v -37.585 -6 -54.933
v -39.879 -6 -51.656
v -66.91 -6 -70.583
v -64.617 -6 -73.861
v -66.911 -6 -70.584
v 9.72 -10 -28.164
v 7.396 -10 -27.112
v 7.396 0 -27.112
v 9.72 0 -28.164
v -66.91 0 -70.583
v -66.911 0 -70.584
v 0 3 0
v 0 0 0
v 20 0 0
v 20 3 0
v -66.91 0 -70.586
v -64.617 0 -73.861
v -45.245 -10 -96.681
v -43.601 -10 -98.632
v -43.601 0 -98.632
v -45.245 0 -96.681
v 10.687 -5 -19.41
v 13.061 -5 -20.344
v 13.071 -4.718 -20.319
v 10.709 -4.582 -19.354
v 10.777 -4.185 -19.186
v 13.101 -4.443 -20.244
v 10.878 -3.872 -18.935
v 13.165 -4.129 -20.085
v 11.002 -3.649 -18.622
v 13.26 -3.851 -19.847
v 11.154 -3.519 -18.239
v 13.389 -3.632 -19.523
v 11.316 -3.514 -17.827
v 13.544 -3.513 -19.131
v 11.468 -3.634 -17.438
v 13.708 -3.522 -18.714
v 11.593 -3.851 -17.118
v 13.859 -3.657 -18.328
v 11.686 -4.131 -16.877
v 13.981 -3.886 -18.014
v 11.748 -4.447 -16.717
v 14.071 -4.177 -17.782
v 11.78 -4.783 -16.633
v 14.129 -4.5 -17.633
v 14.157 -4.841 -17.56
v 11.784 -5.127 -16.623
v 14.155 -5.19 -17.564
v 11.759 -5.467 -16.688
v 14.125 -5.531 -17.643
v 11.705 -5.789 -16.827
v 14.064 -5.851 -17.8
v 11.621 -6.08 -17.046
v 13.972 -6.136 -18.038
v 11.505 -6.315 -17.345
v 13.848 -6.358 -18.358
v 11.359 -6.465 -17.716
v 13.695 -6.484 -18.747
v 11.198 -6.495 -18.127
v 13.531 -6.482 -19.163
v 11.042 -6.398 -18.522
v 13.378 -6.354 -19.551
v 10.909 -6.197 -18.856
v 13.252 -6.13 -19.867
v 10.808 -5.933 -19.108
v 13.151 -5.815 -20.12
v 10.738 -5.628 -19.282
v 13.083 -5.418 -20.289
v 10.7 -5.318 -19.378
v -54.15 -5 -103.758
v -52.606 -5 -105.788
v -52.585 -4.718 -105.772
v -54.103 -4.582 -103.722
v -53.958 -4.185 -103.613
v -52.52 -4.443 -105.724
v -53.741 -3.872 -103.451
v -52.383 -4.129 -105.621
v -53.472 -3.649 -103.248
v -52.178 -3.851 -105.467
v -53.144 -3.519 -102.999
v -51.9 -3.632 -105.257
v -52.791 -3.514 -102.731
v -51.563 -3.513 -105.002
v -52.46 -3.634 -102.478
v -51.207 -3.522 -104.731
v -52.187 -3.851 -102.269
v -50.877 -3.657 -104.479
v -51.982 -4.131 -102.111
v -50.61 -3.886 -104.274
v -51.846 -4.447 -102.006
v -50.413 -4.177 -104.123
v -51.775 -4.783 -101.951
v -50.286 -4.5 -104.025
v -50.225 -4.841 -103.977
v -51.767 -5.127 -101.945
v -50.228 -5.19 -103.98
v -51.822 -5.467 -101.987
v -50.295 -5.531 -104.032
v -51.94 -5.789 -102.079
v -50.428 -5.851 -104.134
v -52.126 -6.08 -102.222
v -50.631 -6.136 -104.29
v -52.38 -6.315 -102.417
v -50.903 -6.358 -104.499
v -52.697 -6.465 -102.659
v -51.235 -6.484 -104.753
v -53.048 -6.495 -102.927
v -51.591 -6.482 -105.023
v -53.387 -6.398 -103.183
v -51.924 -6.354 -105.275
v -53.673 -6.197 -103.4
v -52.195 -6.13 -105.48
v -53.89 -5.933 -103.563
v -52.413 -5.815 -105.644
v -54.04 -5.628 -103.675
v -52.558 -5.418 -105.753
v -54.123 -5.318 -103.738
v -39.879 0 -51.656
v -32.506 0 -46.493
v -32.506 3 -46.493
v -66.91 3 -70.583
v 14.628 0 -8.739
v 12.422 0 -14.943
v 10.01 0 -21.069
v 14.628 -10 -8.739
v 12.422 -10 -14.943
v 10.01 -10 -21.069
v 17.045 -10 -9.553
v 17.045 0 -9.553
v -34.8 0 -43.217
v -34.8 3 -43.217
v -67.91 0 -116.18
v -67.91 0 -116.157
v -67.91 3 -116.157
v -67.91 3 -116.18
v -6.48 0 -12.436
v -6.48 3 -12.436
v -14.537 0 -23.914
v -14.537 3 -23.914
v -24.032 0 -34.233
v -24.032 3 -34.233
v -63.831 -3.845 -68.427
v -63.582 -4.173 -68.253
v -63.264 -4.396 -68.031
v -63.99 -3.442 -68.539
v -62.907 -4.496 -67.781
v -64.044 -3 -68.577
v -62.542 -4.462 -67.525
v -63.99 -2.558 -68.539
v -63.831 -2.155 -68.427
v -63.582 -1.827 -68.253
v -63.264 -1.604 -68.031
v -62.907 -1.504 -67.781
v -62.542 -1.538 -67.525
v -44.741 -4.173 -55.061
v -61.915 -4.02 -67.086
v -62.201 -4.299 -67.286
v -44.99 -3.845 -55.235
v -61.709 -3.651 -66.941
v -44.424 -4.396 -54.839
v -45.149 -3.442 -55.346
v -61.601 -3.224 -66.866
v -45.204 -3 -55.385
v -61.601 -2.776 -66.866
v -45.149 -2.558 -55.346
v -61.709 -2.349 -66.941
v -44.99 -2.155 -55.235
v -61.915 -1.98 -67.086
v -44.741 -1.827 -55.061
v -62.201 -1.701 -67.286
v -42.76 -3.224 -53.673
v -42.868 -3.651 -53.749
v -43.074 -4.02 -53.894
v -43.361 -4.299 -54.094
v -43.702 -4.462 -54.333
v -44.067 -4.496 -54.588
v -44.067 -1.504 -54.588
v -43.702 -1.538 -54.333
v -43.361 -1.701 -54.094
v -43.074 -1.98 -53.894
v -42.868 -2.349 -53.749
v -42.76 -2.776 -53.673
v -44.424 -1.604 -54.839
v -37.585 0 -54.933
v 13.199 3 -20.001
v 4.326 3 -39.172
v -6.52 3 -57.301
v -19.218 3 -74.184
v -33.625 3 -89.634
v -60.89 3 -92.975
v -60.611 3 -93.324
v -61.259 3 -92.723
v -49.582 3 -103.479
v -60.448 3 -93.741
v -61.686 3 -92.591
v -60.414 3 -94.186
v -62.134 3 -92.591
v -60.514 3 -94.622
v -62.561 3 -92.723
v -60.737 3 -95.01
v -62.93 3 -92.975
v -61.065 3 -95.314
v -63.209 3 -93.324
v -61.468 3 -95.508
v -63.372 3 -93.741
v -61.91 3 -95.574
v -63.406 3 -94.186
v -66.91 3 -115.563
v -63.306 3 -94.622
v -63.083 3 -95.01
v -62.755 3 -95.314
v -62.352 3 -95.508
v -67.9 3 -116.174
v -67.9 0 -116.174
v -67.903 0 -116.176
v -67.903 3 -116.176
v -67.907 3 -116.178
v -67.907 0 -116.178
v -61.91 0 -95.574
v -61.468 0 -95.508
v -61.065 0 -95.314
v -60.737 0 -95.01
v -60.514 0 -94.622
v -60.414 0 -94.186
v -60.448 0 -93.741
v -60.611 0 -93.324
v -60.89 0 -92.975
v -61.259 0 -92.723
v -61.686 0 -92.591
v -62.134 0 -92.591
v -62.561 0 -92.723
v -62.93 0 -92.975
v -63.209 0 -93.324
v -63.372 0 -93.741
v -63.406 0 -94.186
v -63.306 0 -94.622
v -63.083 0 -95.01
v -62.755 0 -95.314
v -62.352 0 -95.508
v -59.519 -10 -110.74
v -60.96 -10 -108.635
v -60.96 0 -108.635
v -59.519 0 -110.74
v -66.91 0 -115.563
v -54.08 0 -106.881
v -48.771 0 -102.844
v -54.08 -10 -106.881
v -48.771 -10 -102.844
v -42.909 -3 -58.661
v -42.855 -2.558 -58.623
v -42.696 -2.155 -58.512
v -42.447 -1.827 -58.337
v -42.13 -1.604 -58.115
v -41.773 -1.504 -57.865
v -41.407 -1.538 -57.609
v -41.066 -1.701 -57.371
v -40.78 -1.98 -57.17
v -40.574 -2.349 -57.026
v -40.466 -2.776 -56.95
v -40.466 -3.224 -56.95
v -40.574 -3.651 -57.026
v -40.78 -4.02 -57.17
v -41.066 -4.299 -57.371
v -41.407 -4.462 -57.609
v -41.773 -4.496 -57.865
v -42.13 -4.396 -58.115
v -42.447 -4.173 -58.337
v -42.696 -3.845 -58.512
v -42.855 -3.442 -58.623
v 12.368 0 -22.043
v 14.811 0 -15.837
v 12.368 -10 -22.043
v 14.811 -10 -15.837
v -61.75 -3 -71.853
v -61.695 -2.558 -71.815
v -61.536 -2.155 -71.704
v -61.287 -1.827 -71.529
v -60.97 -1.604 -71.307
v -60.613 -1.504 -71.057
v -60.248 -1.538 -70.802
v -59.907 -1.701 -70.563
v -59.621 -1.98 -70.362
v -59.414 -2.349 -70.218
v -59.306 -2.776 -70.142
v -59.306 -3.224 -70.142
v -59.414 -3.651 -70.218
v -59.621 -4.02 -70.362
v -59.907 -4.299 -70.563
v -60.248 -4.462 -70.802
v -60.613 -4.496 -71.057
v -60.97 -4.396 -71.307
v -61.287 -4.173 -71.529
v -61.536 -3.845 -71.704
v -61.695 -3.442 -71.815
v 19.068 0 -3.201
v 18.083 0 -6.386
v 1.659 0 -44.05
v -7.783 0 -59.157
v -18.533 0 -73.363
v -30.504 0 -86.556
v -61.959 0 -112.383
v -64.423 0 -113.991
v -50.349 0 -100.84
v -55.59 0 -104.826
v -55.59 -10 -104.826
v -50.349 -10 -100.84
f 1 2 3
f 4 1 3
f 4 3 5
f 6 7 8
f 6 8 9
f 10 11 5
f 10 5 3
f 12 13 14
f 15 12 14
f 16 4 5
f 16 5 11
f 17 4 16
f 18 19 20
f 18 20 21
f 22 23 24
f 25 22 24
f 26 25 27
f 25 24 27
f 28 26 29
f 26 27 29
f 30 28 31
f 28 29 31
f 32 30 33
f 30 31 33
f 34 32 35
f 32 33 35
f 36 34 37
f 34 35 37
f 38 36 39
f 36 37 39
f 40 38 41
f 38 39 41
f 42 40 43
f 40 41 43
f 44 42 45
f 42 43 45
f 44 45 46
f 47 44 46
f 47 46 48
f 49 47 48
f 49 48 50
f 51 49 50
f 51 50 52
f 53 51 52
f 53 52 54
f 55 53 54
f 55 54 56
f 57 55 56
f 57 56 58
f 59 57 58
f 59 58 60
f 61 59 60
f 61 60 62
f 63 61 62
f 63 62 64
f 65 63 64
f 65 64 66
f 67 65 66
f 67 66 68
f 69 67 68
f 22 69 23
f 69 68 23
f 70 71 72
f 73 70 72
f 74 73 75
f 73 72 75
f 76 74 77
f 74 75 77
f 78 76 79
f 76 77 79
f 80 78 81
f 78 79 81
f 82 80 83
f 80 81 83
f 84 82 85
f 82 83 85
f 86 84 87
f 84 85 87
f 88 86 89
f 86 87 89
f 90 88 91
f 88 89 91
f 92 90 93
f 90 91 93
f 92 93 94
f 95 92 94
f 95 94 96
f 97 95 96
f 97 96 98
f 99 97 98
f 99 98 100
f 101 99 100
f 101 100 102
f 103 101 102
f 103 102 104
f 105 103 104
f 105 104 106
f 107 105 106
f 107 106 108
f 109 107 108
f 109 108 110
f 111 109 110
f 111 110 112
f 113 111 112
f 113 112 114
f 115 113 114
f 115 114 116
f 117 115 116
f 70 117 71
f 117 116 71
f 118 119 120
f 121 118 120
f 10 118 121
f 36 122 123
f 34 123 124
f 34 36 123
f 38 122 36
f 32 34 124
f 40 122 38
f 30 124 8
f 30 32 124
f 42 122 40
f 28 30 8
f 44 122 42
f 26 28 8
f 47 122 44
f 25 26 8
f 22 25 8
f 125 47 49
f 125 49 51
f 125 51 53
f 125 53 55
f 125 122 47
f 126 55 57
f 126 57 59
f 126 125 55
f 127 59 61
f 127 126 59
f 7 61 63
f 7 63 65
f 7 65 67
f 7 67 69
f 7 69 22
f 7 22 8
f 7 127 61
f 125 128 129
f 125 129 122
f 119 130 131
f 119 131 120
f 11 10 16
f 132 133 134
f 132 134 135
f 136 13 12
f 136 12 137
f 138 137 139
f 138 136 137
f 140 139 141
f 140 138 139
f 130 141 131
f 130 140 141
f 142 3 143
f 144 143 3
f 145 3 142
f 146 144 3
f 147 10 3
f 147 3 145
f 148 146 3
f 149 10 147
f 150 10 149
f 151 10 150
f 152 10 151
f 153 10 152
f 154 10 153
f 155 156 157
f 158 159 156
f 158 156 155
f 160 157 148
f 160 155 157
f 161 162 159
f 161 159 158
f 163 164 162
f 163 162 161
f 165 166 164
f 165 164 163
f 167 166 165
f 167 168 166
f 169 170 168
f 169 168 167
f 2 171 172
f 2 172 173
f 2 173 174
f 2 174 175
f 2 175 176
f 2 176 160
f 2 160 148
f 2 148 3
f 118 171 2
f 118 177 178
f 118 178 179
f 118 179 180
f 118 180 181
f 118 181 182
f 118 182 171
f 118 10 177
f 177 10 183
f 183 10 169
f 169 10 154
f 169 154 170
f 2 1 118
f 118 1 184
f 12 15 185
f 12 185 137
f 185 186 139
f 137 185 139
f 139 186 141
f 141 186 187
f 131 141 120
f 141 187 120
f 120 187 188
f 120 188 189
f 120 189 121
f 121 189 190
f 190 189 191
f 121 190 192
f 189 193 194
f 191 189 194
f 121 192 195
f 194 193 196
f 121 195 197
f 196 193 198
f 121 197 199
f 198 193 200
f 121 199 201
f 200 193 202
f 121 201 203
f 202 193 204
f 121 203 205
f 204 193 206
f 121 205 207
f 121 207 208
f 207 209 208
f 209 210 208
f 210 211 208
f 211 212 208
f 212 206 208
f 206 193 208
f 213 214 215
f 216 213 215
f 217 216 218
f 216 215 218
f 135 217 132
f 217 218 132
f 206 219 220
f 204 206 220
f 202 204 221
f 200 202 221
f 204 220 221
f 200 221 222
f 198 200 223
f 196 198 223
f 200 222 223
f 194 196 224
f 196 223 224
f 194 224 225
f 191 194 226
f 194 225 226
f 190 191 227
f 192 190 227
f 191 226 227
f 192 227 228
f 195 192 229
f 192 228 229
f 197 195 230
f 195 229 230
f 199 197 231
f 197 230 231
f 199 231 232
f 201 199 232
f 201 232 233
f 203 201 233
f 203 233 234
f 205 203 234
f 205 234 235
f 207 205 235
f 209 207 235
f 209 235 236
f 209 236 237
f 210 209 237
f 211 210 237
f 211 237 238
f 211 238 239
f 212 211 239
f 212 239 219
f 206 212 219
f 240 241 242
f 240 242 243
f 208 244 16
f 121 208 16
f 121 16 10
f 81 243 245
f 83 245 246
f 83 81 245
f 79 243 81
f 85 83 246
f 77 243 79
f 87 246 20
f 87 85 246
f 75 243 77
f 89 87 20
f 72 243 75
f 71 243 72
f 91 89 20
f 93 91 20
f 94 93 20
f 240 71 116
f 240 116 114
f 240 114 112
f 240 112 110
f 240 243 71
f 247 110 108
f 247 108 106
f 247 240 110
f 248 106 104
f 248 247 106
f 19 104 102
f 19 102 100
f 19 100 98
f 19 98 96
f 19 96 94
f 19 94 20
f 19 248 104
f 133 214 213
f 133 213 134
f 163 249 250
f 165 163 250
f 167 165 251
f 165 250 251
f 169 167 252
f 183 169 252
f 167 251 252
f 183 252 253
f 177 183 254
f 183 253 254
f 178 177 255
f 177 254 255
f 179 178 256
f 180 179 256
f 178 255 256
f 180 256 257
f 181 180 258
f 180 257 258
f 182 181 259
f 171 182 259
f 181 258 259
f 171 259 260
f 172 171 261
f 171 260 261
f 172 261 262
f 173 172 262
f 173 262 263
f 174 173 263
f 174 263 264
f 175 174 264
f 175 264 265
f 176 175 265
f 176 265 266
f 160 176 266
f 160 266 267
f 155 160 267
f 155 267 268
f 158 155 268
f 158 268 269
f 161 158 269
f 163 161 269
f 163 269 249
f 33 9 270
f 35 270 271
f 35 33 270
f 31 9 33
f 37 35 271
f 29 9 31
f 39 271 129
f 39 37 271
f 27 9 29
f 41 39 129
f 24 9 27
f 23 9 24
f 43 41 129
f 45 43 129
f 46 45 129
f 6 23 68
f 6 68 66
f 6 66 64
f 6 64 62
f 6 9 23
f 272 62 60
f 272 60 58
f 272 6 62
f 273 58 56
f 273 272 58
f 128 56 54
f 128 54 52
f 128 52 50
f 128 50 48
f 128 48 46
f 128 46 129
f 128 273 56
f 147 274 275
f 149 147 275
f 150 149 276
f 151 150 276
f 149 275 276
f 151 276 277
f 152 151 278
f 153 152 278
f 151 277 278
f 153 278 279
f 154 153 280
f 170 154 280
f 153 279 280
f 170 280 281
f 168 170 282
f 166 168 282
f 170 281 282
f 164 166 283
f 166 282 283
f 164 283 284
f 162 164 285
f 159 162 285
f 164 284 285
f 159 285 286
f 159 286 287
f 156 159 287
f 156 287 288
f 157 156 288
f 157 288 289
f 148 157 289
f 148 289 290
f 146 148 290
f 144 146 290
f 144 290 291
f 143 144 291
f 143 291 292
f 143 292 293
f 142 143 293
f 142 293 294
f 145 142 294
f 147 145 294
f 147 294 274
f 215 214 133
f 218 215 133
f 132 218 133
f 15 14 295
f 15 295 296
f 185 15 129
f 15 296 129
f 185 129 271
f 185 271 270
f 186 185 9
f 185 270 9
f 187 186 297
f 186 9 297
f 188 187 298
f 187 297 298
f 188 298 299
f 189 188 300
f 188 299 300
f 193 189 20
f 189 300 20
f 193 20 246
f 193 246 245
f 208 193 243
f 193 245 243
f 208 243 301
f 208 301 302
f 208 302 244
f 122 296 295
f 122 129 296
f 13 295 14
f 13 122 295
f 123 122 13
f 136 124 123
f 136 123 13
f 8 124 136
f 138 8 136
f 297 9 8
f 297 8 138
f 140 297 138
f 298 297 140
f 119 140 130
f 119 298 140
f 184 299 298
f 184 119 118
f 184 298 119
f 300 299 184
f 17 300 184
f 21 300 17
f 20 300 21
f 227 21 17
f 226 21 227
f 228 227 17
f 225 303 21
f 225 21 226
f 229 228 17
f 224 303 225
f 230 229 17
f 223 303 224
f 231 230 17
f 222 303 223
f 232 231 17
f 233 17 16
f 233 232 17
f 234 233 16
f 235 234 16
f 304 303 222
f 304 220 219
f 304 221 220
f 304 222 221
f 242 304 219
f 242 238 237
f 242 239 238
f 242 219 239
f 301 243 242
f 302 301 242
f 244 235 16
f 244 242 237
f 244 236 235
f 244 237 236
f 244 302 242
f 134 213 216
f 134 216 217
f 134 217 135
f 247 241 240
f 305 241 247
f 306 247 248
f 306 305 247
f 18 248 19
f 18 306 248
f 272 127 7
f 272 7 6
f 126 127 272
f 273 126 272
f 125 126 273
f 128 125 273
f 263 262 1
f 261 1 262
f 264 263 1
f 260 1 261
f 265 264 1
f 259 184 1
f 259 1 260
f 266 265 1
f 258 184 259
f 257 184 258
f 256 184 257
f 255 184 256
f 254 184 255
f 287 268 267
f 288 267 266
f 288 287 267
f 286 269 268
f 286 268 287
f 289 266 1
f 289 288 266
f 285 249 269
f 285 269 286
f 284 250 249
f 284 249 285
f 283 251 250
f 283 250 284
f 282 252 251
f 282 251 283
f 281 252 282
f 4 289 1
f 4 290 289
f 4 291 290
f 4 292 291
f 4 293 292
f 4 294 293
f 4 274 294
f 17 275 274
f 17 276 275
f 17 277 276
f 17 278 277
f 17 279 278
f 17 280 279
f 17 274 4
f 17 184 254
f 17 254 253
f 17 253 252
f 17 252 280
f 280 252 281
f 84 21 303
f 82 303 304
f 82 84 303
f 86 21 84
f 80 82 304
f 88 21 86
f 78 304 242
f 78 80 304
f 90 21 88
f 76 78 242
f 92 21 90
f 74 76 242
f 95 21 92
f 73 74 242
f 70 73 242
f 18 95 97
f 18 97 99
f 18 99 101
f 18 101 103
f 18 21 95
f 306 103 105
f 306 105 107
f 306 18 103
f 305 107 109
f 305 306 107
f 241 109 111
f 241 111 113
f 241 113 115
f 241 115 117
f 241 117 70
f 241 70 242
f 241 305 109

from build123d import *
from build123d.topology import SkipClean

# Parameters (mm, degrees)
BOSS_EXTRUDE1_DEPTH = 3
BOSS_EXTRUDE2_DEPTH = 6
SKETCH3_R           = 1.5
SKETCH3_W           = 9.001604742
SKETCH3_H           = 6
SKETCH3_W_2         = 4.02
CUT_EXTRUDE1_DEPTH  = 127.726009226
BOSS_EXTRUDE3_DEPTH = 3
BOSS_EXTRUDE4_START = 10
BOSS_EXTRUDE4_DEPTH = 10
SKETCH8_R           = 1.5
CUT_EXTRUDE2_DEPTH  = 128.550079345
SKETCH9_R           = 1.5
CUT_EXTRUDE3_DEPTH  = 140.296860914
CUT_EXTRUDE5_DEPTH  = 135.942804558
SKETCH10_R          = 1.5
CUT_EXTRUDE4_DEPTH  = 135.942804558


with BuildPart() as part:
    # Sketch1 → Boss-Extrude1 (new body)
    with BuildSketch(Plane(origin=(0, 0, 0), x_dir=(1, 0, 0), z_dir=(0, 1, 0))):
        with BuildLine():
            Line((0, 0), (20, 0))
            ThreePointArc((20, 0), (-12.999728612, 66.379532688), (-67.91, 116.18))
            Line((-67.91, 116.18), (-67.91, 72.58))
            ThreePointArc((-67.91, 72.58), (-27.76846685, 42.078474321), (0, 0))
        make_face()
    extrude(amount=BOSS_EXTRUDE1_DEPTH)

    # Sketch2 → Boss-Extrude2 (add)
    with BuildSketch(Plane.XZ):
        Polygon((-66.91, -70.583412503), (-32.50561414, -46.493202176), (-32.50561414, -51.376300531), (-67.91, -76.166718396), (-67.91, -71.283620041), align=None)
    extrude(amount=BOSS_EXTRUDE2_DEPTH)

    # Sketch3 → Cut-Extrude1 (cut, through all)
    with BuildSketch(Plane(origin=(13.44494558, 0, -19.201372231), x_dir=(-0.8191520442889929, 0, -0.5735764363510446), z_dir=(0.5735764363510446, 0, -0.819152044288993))):
        with Locations((90.296050234, -3)):
            Circle(SKETCH3_R)
        with Locations((67.296050234, -3)):
            Circle(SKETCH3_R)
        with Locations((57.795247863, -3)):
            Rectangle(SKETCH3_W, SKETCH3_H)
        with Locations((97.306050234, -3)):
            Rectangle(SKETCH3_W_2, SKETCH3_H)
    extrude(amount=-CUT_EXTRUDE1_DEPTH, mode=Mode.SUBTRACT)

    # Sketch5 → Boss-Extrude3 (add)
    with BuildSketch(Plane(origin=(0, 0, 0), x_dir=(1, 0, 0), z_dir=(0, 1, 0))):
        with BuildLine():
            Line((-66.911314527, 70.584332945), (-67.91, 70.584332945))
            Line((-67.91, 70.584332945), (-67.91, 72.58))
            ThreePointArc((-67.91, 72.58), (-27.76846685, 42.078474321), (0, 0))
            ThreePointArc((0, 0), (-14.53687211, 23.913782415), (-34.799919885, 43.216593999))
            Line((-34.799919885, 43.216593999), (-32.50561414, 46.493202176))
            Line((-32.50561414, 46.493202176), (-66.911314527, 70.584332945))
        make_face()
    extrude(amount=BOSS_EXTRUDE3_DEPTH)

    # Sketch6 → Boss-Extrude4 (add)
    with SkipClean():  # the faces are left unmerged after this step: merging them gives an invalid solid
        with BuildSketch(Plane.XZ.offset(BOSS_EXTRUDE4_START)):
            with BuildLine():
                Line((17.045225443, -9.553497125), (14.627759947, -8.739050999))
                ThreePointArc((14.627759947, -8.739050999), (11.241753199, -18.015971085), (7.396135604, -27.111987428))
                Line((7.396135604, -27.111987428), (9.72017103, -28.163805501))
                ThreePointArc((9.72017103, -28.163805501), (13.615472666, -18.950271792), (17.045225443, -9.553497125))
            make_face()
            with BuildLine():
                Line((-43.600864087, -98.631759771), (-45.244796978, -96.681132546))
                ThreePointArc((-45.244796978, -96.681132546), (-52.953020273, -102.854428394), (-60.960267052, -108.634591628))
                Line((-60.960267052, -108.634591628), (-59.519372567, -110.739653386))
                ThreePointArc((-59.519372567, -110.739653386), (-51.408674946, -104.884812453), (-43.600864087, -98.631759771))
            make_face()
        extrude(amount=-BOSS_EXTRUDE4_DEPTH)

    # Sketch8 → Cut-Extrude2 (cut, through all)
    with SkipClean():  # the faces are left unmerged after this step: merging them gives an invalid solid
        with BuildSketch(Plane(origin=(-51.408674946, -10, -104.884812453), x_dir=(-0.7959254239888501, 0, -0.6053946807233851), z_dir=(0.6053946807233851, 0, -0.7959254239888501))):
            with Locations((0, 5)):
                Circle(SKETCH8_R)
        extrude(amount=-CUT_EXTRUDE2_DEPTH, mode=Mode.SUBTRACT)

    # Sketch9 → Cut-Extrude3 (cut, through all)
    with SkipClean():  # the faces are left unmerged after this step: merging them gives an invalid solid
        with BuildSketch(Plane(origin=(18.247403502, 0, -7.182214333), x_dir=(-0.36625272068036274, 0, -0.9305154187837148), z_dir=(0.9305154187837148, 0, -0.36625272068036274))):
            with Locations((12.646816185, -5)):
                Circle(SKETCH9_R)
        extrude(amount=-CUT_EXTRUDE3_DEPTH, mode=Mode.SUBTRACT)

    # Sketch11 → Cut-Extrude5 (cut, through all)
    with SkipClean():  # the faces are left unmerged after this step: merging them gives an invalid solid
        with BuildSketch(Plane.XZ):
            with BuildLine():
                Line((-66.91, -70.583412503), (-66.91, -115.562519451))
                Line((-66.91, -115.562519451), (-66.91, -117.748905653))
                Line((-66.91, -117.748905653), (-78.626173162, -99.102139907))
                ThreePointArc((-78.626173162, -99.102139907), (-78.831832297, -91.769406487), (-72.513559714, -88.042382652))
                Line((-72.513559714, -88.042382652), (-69.539157742, -68.426897103))
                Line((-69.539157742, -68.426897103), (-66.91, -70.583412503))
            make_face()
        extrude(amount=-CUT_EXTRUDE5_DEPTH, mode=Mode.SUBTRACT)


with BuildPart() as cut_extrude5_piece_1:
    # of the separate pieces the step leaves, piece 1, a body of its own (cut_extrude5_pieces)
    add(part.part.solids().sort_by_distance((-64.617008782, 0, -73.860941122))[0])

    # Sketch10 → Cut-Extrude4 (cut, through all)
    with SkipClean():  # the faces are left unmerged after this step: merging them gives an invalid solid
        with BuildSketch(Plane.XZ):
            with Locations(Location((-61.91, -94.074364868, 0), (0, 0, 270))):
                Circle(SKETCH10_R)
        extrude(amount=-CUT_EXTRUDE4_DEPTH, mode=Mode.SUBTRACT)


with BuildPart() as cut_extrude5_piece_2:
    # of the separate pieces the step leaves, piece 2, a body of its own (cut_extrude5_pieces)
    add(part.part.solids().sort_by_distance((-67.91, 0, -116.18))[0])


solid = Compound([cut_extrude5_piece_1.part, cut_extrude5_piece_2.part])
